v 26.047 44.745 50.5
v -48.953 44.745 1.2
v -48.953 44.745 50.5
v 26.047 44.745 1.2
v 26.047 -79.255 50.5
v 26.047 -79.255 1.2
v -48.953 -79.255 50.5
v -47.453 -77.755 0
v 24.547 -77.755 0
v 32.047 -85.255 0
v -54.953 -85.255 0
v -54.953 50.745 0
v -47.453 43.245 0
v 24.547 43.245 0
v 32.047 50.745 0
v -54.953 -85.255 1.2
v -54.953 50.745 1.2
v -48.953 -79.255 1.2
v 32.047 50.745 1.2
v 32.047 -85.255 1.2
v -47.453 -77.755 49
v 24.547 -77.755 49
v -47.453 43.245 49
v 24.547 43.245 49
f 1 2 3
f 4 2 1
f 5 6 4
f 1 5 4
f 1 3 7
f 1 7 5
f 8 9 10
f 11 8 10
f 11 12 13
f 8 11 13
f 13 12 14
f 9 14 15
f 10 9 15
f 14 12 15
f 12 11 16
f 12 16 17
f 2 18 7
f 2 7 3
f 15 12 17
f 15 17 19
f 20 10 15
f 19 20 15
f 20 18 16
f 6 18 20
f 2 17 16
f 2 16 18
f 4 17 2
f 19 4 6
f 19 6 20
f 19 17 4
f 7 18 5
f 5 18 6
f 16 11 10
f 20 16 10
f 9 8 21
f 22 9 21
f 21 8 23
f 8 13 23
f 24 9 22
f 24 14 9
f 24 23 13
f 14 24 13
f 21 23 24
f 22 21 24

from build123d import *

# Parameters (mm, degrees)
F0_W        = 75
F0_H        = 124
F1_DEPTH    = 50.5
F0_W_2      = 87
F0_H_2      = 136
F2_DEPTH    = 1.2
F3_T        = 1.5
F3_T3_DEPTH = 78
F3_T5_DEPTH = 127


# Not quite as in the source:
# - a shell that OpenCascade refuses in one call is made with other operations: the cavity is built on its own and cut out


with BuildPart() as f1:
    # F0 (on Top) → F1 (new body)
    with BuildSketch(Plane.XY):
        with Locations((-11.4526251853, -17.2550516479)):
            Rectangle(F0_W, F0_H)
    extrude(amount=F1_DEPTH)

    # F0 (on Top) → F2 (join)
    with BuildSketch(Plane.XY):
        with Locations((-11.4526251853, -17.2550516479)):
            Rectangle(F0_W_2, F0_H_2)
        with Locations((-11.4526251853, -17.2550516479)):
            Rectangle(F0_W, F0_H, mode=Mode.SUBTRACT)
    extrude(amount=F2_DEPTH)

    # F3: shell of thickness 1.5, made by hand


with BuildPart() as f3_core1:
    # F3_t2: copy of F1
    add(f1.part)

    # the walls: a layer under each face that stays
    f3_faces = [f3_core1.faces().sort_by_distance(p)[0] for p in [
        (-11.4526251853, 44.7449483521, 25.85),
        (-52.0526251853, -80.7217183146, 1.2),
        (-48.9526251853, -17.2550516479, 25.85),
        (-11.4526251853, -17.2550516479, 50.5),
        (26.0473748147, -17.2550516479, 25.85),
        (-11.4526251853, -85.2550516479, 0.6),
        (32.0473748147, -17.2550516479, 0.6),
        (-11.4526251853, 50.7449483521, 0.6),
        (-54.9526251853, -17.2550516479, 0.6),
        (-11.4526251853, -79.2550516479, 25.85),
    ]]
    thicken(f3_faces, amount=-F3_T, mode=Mode.SUBTRACT)

    # F3_s4 → F3_t3 (cut)
    with BuildSketch(Plane.YZ.offset(-50.4526251853)):
        Polygon((44.7599483521, 1.215), (43.2449483521, 1.2), (43.2449483521, -0.3), (44.7449483521, -0.3), align=None)
        Polygon((-79.2700516479, 1.215), (-79.2550516479, -0.3), (-77.7550516479, -0.3), (-77.7550516479, 1.2), align=None)
    extrude(amount=F3_T3_DEPTH, mode=Mode.SUBTRACT)

    # F3_s6 → F3_t5 (cut)
    with BuildSketch(Plane.XZ.offset(-46.2449483521)):
        Polygon((26.0623748147, 1.215), (26.0473748147, -0.3), (24.5473748147, -0.3), (24.5473748147, 1.2), align=None)
        Polygon((-48.9676251853, 1.215), (-48.9526251853, -0.3), (-47.4526251853, -0.3), (-47.4526251853, 1.2), align=None)
    extrude(amount=F3_T5_DEPTH, mode=Mode.SUBTRACT)


with BuildPart() as f1_1:
    add(f1.part)

    # what is left inside the walls is the cavity
    f3_cavity = [f3_core1.part.solids().sort_by_distance(p)[0] for p in [
        (-11.452625, -37.421718, 0.015),
    ]]
    add(f3_cavity, mode=Mode.SUBTRACT)


solid = f1_1.part
